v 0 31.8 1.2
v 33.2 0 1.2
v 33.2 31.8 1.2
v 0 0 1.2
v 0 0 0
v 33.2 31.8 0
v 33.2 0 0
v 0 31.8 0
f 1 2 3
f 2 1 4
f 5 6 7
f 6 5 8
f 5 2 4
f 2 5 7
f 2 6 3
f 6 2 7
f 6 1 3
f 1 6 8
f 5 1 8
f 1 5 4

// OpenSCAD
thickness=1.2;
shell=1.6;
spacing=1;
comfort=0.25;

blades=5;

bit=3;
bits=7;
clasp=25;

nozzle_rows=2;
nozzle_cols=3;

small_fineness=40;
tiny_fineness=9;



function ngon(count, radius, i = 0, result = []) = i < count
    ? ngon(count, radius, i + 1, concat(result, [[ radius*sin(360/count*i), radius*cos(360/count*i) ]]))
    : result;


module blade_holder(){
    difference(){

        translate([0,2,0])
        cube([40+thickness*2,18+thickness,2*thickness+1.5*blades+spacing*(blades-1)]);

        translate([thickness,0,thickness])
        for (i=[0:blades-1]){
            translate([0,2-0.001,(1.5+spacing)*i])
            cube([40,18+0.001,1.5]);
        }

    }
}

module bits_holder(){
    
    cube([bits*bit+(bits-1)*spacing+thickness*2*bits,40+thickness*2,thickness]);
    cube([bits*bit+(bits-1)*spacing+thickness*2*bits,thickness,3+thickness]);
    translate([0,40+thickness,0])
    cube([bits*bit+(bits-1)*spacing+thickness*2*bits,thickness,3+thickness]);

    for (i=[0:bits-1]){
        translate([bit*i+thickness*2*i+spacing*i,thickness+11,thickness-0.001])
        difference(){
            cube([bit+thickness*2,4,bit+0.001]);
            translate([bit/2+thickness-(sin(90-clasp)*bit/2),-0.001,0.001])
            cube([sin(90-clasp)*bit,4+0.002,bit+0.001]);
            translate([thickness,-0.001,0.001])
            cube([bit,4+0.002,bit/2+cos(90-clasp)*bit/2]);
        }
    }
}

module bits(){
    for (i=[0:bits-1]){
        translate([bit*i+thickness*2*i+spacing*i+thickness+bit/2,thickness,thickness+bit/2])
        rotate([-90,0,0]){
            %cylinder(22,bit/2,bit/2,$fn=small_fineness);
            translate([0,0,22-0.001])
            %cylinder(16+0.001,0.4/2,0.4/2,$fn=tiny_fineness);
        }
    }
}

module nozzle(){
    translate([0,0,6.5+3+1.5-0.001])
    cylinder(2+0.001,4.5/2,1.5/2,$fn=small_fineness);

    translate([0,0,1.5+6.5])
    rotate([0,0,30])
    linear_extrude(3,convexity=10)
    polygon(points=ngon(6,4));

    translate([0,0,6.5-0.001])
    cylinder(1.5+0.002,4/2,4/2,$fn=small_fineness);

    cylinder(6.5,6/2,6/2,$fn=small_fineness);
}

module nozzles(){

    for (i=[0:nozzle_rows-1]){
        for (j=[0:nozzle_cols-1]){
            translate([8/2+thickness+thickness*2*j+8*j+spacing*j,thickness+thickness*2*i+(2+3+1.5+6.5)*i+spacing*i,thickness+8/2])
            rotate([-90,0,0])
            nozzle();
        }
    }
}

module nozzle_holder(){
    cube([nozzle_cols*8+nozzle_cols*2*thickness+(nozzle_cols-1)*spacing,13*nozzle_rows+thickness*2*nozzle_rows+(nozzle_rows-1)*spacing,thickness]);
}

%nozzles();
nozzle_holder();
